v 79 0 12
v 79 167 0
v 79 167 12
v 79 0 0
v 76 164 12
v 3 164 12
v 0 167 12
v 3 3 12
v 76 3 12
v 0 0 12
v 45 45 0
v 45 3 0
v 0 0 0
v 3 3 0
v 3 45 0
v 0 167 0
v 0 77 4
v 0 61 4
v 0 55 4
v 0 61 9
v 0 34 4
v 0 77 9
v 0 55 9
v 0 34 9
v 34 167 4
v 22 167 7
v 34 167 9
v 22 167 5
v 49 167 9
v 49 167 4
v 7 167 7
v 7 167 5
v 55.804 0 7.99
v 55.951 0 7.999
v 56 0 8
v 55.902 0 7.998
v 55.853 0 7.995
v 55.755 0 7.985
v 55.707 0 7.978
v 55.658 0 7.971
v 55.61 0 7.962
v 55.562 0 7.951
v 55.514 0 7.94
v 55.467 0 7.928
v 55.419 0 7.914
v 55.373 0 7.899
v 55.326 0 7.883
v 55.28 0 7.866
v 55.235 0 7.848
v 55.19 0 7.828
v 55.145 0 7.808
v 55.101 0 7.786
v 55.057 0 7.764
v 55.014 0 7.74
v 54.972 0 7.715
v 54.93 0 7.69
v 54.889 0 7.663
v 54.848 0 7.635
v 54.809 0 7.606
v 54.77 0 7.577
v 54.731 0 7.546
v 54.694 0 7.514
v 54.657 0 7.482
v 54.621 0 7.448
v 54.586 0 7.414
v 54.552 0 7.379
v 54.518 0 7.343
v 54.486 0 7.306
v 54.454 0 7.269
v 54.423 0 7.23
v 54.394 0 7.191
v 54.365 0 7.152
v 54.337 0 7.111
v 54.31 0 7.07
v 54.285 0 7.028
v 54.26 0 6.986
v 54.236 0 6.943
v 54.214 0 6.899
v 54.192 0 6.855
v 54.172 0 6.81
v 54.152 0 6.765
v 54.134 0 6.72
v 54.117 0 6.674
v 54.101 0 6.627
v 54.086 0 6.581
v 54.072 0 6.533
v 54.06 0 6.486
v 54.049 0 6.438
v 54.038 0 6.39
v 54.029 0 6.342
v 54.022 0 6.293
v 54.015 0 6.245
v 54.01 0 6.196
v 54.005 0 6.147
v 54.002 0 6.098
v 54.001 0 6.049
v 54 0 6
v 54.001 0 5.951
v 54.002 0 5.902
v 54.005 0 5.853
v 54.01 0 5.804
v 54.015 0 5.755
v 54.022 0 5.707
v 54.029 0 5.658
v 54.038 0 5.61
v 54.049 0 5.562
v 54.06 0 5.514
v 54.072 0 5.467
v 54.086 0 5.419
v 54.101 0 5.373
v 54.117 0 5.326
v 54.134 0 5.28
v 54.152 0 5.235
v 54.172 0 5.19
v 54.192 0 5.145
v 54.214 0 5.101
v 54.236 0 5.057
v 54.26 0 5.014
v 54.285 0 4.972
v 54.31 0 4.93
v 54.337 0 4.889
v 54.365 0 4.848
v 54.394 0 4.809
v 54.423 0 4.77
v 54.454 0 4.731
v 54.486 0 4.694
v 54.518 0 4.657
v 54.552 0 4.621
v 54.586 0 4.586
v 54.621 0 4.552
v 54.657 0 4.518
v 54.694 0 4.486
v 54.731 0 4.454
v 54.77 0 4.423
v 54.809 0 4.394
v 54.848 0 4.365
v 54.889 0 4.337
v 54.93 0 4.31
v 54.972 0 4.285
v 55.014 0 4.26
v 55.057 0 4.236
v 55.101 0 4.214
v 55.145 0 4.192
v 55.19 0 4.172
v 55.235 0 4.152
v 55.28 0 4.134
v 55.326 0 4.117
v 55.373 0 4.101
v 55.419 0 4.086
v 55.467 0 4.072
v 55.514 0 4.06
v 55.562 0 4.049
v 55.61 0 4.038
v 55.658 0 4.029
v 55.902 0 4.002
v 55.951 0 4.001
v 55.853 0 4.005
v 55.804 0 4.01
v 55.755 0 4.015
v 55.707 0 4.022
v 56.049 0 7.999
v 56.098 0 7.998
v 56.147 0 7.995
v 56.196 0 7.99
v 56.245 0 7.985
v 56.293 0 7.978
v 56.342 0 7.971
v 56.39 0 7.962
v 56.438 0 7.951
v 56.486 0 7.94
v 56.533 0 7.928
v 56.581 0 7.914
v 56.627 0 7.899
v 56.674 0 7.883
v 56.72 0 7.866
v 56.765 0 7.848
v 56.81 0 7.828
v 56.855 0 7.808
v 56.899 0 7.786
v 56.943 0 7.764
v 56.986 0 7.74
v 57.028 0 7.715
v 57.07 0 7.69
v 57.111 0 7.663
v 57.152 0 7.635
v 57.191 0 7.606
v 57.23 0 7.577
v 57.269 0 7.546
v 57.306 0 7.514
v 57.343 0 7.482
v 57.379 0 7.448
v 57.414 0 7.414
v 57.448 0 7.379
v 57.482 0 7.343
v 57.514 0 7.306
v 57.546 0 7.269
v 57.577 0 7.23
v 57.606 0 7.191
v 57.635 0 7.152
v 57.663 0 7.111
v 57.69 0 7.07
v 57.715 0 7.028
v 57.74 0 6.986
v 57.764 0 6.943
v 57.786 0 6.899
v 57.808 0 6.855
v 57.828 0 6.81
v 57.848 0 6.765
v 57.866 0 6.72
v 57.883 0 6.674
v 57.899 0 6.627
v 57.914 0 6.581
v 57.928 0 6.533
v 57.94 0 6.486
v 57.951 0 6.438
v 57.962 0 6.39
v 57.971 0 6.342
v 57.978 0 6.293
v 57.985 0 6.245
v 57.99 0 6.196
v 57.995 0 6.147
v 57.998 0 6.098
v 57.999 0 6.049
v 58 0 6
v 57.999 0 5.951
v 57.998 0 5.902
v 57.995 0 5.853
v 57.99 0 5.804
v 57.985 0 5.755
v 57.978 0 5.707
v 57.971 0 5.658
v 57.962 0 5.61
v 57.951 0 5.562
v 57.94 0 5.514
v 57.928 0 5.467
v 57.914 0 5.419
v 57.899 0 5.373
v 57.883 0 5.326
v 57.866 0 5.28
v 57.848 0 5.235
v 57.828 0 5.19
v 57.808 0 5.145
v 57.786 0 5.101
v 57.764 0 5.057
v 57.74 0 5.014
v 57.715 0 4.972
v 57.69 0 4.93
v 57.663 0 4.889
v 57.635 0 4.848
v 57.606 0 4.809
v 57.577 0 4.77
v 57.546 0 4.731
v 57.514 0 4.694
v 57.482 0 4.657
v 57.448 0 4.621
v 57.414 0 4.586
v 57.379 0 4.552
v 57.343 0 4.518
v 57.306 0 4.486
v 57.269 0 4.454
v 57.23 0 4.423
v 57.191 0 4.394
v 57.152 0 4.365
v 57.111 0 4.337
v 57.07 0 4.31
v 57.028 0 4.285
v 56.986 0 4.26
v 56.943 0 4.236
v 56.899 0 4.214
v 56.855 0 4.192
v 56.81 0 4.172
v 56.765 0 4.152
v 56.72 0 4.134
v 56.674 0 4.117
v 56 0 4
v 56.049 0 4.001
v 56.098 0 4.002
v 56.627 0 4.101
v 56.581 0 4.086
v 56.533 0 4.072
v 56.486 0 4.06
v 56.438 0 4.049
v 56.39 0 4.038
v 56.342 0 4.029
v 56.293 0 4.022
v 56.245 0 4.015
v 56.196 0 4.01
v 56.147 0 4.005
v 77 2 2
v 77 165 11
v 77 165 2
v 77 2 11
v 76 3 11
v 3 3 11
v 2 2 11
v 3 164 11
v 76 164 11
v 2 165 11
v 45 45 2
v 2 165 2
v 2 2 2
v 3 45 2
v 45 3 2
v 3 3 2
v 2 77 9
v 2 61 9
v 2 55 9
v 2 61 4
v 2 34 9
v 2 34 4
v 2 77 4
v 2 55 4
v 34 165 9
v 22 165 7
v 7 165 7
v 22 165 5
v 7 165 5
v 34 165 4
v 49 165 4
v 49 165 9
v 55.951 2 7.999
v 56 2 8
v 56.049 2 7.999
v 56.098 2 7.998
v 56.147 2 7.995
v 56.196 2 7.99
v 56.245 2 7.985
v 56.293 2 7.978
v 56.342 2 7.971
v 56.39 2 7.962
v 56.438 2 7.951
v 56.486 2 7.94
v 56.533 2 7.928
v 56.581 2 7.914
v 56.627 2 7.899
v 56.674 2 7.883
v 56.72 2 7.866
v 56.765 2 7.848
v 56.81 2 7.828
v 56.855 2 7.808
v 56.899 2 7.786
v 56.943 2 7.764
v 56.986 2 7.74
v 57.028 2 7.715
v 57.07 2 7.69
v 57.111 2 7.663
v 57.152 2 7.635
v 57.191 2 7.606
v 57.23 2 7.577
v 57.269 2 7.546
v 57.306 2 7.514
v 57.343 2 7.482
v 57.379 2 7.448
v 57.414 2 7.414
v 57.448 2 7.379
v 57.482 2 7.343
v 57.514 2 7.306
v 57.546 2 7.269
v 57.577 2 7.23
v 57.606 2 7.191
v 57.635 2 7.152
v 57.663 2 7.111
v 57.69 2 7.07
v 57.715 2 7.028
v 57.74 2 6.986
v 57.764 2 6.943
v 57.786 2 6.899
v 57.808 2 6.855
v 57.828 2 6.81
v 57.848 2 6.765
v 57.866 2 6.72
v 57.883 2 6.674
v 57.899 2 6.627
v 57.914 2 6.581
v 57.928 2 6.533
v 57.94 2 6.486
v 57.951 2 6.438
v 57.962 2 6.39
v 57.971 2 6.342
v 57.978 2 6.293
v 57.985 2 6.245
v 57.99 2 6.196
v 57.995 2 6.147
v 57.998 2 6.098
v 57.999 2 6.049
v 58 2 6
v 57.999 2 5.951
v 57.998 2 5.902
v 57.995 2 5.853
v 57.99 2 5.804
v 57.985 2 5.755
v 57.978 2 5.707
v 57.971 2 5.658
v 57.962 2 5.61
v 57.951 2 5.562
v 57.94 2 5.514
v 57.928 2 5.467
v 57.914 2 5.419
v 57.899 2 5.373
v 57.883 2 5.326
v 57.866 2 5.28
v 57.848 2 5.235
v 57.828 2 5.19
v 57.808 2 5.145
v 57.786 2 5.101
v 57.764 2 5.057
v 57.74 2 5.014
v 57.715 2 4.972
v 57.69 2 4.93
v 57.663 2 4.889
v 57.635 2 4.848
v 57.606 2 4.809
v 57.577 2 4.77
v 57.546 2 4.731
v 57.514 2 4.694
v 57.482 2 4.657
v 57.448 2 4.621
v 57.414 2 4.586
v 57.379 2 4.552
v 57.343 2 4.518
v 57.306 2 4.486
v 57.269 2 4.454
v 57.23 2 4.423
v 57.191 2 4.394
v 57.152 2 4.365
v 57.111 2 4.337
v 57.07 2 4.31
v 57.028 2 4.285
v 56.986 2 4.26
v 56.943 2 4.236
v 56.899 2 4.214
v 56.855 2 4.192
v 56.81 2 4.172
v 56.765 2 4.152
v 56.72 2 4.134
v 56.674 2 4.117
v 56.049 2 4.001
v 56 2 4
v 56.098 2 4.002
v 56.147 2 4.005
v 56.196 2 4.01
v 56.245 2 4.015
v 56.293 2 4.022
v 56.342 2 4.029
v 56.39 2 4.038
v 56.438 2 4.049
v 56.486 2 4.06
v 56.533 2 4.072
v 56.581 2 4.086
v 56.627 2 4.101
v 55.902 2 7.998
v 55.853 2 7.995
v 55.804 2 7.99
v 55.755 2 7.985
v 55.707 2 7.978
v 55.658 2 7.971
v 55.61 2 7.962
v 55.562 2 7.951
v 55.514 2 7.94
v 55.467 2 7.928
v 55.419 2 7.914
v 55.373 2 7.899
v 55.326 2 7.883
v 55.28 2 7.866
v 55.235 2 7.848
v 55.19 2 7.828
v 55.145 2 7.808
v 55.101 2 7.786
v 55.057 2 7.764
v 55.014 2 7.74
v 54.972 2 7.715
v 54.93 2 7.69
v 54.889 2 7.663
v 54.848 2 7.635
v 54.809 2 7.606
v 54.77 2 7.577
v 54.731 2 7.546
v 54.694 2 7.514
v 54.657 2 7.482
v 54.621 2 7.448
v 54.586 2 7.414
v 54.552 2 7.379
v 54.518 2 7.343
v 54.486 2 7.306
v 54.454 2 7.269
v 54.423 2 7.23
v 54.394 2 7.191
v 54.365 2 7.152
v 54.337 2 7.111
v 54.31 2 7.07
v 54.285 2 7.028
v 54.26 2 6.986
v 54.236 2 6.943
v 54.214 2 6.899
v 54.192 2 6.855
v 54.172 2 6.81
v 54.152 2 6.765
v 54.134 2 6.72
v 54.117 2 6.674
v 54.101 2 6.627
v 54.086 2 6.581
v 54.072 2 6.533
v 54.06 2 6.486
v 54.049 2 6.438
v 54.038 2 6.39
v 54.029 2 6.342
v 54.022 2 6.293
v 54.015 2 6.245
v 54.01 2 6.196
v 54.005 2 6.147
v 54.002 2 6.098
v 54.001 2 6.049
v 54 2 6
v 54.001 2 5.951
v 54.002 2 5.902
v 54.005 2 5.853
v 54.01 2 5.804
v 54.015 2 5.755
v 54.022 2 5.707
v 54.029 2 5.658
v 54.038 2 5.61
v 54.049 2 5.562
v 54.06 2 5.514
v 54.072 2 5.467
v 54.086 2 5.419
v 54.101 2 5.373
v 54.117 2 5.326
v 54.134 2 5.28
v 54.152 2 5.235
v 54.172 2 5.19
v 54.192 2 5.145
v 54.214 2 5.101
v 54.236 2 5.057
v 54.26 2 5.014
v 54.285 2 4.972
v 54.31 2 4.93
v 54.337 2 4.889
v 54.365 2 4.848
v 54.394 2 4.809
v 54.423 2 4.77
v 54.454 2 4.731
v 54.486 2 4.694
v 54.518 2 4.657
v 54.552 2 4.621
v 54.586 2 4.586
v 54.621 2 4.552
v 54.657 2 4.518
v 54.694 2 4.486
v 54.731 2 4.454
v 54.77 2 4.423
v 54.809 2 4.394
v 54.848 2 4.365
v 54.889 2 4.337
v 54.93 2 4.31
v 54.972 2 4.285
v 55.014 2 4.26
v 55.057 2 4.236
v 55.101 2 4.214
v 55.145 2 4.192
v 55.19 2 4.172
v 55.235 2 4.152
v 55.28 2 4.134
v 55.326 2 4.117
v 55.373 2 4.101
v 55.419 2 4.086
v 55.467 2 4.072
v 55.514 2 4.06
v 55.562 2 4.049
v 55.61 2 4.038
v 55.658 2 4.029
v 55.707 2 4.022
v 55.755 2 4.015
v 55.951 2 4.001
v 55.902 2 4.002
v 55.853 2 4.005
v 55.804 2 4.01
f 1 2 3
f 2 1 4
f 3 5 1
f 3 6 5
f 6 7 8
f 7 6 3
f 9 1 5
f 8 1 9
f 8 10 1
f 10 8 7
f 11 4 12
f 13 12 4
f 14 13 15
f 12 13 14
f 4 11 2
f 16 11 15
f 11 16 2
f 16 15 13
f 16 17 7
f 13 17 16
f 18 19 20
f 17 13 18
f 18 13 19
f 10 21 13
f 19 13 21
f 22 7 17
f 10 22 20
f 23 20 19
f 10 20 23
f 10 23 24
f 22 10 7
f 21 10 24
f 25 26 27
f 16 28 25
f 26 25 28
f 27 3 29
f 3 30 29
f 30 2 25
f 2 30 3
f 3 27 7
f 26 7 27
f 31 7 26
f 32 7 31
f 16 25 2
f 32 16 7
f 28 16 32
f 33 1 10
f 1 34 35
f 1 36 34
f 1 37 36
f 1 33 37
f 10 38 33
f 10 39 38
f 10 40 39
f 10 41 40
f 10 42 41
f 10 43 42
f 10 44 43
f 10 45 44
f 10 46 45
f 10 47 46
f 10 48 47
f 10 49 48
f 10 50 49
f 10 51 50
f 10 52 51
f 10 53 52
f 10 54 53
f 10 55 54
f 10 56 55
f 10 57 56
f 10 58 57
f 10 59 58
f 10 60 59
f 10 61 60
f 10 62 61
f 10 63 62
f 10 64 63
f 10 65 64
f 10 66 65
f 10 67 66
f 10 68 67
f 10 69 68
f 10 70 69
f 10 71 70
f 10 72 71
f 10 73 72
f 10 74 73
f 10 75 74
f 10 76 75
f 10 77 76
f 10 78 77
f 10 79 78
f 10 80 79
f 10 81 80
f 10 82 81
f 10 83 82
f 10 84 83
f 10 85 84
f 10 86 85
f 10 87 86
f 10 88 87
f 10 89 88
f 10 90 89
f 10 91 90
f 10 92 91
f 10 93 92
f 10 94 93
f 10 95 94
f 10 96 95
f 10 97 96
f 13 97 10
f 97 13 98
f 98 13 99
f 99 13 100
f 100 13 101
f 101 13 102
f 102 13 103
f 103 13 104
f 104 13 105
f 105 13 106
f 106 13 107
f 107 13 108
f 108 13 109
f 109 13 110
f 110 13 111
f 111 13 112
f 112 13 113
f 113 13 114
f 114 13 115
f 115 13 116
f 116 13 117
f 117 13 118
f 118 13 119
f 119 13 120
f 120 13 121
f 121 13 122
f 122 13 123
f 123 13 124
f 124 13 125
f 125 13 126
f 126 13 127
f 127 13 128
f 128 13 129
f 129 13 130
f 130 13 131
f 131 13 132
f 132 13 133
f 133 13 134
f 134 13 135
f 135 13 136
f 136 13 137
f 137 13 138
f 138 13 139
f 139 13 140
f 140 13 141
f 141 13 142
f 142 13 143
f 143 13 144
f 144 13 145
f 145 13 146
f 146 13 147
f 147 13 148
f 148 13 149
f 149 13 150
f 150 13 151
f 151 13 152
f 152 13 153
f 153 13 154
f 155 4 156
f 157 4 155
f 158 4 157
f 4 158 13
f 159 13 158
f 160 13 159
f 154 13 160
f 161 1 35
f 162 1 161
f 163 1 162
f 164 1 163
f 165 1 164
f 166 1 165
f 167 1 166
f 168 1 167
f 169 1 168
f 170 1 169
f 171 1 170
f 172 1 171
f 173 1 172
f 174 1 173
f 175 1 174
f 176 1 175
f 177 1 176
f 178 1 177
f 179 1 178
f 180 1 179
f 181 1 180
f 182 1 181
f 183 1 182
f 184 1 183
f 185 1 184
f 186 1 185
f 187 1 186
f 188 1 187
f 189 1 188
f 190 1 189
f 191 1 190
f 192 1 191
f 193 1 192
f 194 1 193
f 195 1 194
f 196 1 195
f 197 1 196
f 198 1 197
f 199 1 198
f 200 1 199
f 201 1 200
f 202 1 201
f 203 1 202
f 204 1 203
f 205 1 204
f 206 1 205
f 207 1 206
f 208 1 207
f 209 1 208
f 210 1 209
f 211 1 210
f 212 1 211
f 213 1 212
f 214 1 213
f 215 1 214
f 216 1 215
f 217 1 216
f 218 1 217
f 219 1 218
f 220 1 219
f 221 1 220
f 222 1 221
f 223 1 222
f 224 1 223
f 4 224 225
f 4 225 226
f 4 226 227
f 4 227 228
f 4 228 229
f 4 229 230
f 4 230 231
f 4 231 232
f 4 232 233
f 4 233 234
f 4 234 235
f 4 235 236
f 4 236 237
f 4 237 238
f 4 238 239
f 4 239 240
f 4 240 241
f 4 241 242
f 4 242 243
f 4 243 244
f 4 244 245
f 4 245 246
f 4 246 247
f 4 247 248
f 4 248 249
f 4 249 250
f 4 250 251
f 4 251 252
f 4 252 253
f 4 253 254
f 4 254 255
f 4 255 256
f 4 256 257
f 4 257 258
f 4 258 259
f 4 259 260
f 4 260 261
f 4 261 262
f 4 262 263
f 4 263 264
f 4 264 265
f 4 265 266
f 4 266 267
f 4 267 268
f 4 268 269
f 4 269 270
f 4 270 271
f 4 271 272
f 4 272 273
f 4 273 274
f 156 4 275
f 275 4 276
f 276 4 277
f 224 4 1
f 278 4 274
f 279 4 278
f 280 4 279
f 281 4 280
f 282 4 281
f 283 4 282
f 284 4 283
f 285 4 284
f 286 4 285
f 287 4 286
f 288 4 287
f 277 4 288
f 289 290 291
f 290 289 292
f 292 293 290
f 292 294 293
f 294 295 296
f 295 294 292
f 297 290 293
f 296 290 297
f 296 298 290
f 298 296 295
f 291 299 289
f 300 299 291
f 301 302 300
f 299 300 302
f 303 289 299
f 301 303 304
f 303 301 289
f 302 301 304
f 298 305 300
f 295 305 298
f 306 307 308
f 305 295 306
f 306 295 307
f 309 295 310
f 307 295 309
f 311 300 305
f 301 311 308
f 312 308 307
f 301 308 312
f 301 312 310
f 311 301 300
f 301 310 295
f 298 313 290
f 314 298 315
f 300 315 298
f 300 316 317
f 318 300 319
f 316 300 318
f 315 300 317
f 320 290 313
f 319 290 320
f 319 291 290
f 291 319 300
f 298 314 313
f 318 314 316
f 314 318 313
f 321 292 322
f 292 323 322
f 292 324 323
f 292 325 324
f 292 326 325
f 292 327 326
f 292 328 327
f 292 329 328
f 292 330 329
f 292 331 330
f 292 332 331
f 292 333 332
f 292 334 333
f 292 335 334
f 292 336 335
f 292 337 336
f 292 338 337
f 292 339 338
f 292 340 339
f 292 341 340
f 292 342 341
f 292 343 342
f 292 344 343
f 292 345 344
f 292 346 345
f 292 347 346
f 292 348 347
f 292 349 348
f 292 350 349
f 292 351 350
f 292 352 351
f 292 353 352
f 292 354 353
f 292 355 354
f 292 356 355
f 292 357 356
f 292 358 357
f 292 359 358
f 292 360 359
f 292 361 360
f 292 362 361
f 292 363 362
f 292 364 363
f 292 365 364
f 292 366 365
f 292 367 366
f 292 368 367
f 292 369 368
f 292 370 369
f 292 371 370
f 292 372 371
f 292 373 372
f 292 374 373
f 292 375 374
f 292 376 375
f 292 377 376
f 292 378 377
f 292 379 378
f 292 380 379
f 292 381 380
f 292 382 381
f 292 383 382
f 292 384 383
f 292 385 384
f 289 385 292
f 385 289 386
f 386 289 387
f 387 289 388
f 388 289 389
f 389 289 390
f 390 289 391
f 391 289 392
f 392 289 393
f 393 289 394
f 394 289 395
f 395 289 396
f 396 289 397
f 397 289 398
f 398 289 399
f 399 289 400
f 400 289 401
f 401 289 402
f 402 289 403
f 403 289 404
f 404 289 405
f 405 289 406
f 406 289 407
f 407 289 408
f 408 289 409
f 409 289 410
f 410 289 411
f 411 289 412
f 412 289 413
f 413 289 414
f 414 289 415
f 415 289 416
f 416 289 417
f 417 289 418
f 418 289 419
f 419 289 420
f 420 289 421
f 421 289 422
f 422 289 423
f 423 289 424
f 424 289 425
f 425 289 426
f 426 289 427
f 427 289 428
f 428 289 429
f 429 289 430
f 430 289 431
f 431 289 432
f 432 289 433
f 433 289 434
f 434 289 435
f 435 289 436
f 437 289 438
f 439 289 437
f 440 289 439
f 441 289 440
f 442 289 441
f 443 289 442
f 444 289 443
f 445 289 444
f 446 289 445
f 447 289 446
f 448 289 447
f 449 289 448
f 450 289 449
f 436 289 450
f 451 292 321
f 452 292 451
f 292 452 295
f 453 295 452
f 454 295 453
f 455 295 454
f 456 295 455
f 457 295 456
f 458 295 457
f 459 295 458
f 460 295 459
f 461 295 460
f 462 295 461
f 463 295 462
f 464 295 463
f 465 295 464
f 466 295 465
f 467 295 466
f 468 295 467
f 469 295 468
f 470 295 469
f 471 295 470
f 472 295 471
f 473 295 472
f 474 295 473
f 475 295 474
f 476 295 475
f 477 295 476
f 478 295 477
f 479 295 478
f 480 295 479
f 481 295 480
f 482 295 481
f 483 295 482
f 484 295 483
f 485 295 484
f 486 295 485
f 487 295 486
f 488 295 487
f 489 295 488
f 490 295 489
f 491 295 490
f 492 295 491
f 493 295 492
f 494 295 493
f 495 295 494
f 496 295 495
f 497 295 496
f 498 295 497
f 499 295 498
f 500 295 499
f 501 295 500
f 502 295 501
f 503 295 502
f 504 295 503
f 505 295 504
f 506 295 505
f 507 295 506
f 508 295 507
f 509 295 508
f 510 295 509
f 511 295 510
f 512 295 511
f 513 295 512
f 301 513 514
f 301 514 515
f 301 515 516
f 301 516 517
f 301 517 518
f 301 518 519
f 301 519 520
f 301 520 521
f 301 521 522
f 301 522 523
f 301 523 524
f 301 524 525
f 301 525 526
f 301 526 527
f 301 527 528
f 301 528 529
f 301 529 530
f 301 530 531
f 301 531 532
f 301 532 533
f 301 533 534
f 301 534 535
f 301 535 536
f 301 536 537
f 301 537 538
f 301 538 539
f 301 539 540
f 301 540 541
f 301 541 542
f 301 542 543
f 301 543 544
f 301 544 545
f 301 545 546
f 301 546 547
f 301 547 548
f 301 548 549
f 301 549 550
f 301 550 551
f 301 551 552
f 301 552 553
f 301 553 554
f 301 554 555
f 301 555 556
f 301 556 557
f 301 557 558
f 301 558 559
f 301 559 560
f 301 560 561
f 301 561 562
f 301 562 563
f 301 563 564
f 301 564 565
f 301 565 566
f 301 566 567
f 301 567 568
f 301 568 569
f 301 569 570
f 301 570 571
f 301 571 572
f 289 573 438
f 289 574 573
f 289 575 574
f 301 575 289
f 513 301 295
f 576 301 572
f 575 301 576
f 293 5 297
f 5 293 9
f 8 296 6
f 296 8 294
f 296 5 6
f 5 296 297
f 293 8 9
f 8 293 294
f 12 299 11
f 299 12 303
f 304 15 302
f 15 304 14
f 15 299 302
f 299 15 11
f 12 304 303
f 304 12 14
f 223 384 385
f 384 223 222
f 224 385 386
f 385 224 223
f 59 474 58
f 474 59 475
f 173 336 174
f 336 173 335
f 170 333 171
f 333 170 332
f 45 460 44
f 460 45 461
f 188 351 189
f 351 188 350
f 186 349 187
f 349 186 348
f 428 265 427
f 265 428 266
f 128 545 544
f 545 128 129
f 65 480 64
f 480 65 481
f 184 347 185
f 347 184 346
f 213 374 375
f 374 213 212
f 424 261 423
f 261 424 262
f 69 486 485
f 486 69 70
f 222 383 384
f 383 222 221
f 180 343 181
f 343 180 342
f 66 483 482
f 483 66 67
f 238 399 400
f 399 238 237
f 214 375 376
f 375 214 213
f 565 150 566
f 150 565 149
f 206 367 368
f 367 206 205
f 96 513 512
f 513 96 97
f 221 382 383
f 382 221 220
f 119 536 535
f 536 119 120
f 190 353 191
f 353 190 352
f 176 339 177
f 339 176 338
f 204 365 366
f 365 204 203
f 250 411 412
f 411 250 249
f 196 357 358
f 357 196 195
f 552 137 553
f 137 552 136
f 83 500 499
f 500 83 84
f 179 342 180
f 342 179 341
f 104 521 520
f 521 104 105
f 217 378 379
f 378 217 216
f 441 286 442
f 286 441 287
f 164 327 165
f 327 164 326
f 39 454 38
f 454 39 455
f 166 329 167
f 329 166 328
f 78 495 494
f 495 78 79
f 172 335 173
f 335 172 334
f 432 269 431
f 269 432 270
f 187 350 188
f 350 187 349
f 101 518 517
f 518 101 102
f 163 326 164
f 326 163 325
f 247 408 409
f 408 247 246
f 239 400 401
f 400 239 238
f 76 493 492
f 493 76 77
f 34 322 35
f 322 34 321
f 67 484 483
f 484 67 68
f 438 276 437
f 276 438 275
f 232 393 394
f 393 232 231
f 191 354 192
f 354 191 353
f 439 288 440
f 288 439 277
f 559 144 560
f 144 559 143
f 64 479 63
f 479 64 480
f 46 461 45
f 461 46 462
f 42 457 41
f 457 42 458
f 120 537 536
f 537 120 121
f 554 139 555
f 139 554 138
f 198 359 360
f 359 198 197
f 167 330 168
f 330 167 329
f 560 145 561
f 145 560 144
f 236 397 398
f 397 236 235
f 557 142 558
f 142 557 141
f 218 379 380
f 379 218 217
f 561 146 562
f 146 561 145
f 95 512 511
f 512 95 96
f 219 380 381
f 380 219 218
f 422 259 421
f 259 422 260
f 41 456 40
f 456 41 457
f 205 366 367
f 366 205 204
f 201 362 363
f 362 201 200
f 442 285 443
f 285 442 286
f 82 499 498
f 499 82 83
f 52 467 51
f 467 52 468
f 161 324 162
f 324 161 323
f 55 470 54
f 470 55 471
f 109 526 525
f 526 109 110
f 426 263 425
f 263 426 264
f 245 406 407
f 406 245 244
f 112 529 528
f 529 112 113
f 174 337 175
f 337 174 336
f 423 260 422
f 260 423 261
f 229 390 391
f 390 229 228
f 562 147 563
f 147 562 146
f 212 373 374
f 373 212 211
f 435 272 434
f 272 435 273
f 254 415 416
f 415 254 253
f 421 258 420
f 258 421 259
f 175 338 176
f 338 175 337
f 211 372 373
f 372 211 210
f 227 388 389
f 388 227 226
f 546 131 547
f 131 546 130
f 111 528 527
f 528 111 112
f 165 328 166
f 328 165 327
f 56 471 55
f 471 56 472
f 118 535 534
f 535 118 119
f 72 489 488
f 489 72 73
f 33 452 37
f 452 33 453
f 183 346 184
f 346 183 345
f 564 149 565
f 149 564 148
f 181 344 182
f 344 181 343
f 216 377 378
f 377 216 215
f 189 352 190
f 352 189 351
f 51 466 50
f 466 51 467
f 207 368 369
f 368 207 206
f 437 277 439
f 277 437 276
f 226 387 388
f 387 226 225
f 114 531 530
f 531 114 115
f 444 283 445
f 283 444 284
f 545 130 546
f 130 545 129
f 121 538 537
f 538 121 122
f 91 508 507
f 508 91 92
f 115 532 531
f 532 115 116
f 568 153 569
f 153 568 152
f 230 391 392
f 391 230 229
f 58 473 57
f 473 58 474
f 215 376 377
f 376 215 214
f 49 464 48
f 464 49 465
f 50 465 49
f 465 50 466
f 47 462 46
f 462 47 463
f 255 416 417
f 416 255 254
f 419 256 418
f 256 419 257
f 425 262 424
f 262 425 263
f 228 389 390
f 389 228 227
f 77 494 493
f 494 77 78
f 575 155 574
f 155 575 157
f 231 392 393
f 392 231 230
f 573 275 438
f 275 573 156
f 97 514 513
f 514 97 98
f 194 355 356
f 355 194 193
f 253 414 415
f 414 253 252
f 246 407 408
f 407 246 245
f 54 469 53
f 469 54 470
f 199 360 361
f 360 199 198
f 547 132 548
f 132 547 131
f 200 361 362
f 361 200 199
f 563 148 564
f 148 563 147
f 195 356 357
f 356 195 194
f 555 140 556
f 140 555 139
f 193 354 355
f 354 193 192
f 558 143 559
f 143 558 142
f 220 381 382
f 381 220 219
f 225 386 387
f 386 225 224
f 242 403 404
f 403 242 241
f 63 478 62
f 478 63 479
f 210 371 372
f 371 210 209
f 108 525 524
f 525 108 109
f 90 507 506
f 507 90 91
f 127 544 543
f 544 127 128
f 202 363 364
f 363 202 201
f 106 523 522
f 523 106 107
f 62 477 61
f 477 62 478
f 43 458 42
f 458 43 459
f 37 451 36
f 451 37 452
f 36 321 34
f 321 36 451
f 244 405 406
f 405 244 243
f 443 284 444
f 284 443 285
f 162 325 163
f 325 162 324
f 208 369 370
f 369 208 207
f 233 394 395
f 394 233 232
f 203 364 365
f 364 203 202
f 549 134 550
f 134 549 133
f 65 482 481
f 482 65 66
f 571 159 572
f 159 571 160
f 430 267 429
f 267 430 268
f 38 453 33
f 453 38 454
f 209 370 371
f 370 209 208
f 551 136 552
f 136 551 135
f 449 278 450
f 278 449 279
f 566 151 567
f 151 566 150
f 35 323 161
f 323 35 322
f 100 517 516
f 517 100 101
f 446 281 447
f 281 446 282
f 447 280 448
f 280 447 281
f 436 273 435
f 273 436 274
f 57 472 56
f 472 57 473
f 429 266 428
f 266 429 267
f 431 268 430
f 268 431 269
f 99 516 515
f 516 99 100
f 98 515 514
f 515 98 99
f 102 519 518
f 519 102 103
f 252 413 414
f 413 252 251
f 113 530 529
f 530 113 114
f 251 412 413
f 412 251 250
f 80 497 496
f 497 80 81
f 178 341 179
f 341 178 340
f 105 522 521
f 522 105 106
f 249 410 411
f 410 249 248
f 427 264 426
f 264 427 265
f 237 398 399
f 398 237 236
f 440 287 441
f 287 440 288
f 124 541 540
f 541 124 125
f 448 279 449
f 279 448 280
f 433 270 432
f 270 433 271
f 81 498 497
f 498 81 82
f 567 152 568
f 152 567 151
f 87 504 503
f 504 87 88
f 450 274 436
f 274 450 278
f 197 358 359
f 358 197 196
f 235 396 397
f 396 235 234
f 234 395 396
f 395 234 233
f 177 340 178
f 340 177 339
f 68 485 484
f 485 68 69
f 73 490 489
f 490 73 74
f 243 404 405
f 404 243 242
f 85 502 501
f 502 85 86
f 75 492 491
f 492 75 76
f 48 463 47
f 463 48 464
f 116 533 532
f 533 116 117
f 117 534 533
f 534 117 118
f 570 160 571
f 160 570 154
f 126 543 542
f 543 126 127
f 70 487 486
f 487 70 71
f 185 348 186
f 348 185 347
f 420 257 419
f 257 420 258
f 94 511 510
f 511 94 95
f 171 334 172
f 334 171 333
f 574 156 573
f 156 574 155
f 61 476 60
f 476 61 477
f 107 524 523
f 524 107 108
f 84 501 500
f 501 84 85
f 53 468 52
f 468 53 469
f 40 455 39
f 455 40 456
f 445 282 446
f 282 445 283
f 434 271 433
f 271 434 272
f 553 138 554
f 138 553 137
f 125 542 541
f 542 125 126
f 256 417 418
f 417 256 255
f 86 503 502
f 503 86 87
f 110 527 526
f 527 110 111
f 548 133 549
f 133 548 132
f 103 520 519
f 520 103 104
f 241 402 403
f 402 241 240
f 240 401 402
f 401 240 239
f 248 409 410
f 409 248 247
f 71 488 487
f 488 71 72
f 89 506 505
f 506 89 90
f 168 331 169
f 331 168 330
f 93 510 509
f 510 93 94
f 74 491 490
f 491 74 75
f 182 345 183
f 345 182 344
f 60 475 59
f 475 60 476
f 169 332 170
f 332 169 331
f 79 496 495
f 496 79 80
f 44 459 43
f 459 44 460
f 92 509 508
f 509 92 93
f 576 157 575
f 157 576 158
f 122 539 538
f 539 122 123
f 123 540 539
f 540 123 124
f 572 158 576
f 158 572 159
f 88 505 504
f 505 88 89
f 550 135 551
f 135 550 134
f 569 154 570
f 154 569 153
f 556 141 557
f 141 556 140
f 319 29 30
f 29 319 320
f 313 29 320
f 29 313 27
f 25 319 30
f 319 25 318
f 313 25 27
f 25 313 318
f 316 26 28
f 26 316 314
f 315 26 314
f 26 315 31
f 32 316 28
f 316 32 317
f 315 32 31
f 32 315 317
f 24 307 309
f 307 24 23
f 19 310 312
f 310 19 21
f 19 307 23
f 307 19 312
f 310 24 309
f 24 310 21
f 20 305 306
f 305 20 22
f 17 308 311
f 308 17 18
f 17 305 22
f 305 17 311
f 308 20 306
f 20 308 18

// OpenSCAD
$fn=256;
PhoneD=163;
PhoneW=75;
PhoneH=9;
Wall=2;
DW=Wall*2;
Lip=1;
DL=Lip*2;

difference()
{
  cube([PhoneW+DW,PhoneD+DW,PhoneH+Wall+Lip]);
  translate([Wall,Wall,Wall]) 
    cube([PhoneW,PhoneD,PhoneH]); // Phone cutout
  translate([Wall+Lip,Wall+Lip,Wall])
    cube([PhoneW-DL,PhoneD-DL,PhoneH+DW]); //Lip
  translate([Wall+1,Wall+1,-1]) cube([42,42,DW]); //Camera
  translate([54+Wall,Wall+3,Wall+4]) rotate([90,0,0]) 
    cylinder(d=4,h=10); //Headphone
  translate([32+Wall,PhoneD+Wall-1,Wall+2])
    cube([15,DW,5]); //Charger
  translate([Wall+5,PhoneD+Wall-1,Wall+3])
    cube([15,DW,Wall]); //speaker
  translate([-1,34,DW]) cube([DW,21,5]); //volume
  translate([-1,61,DW]) cube([DW,16,5]); //power
}
